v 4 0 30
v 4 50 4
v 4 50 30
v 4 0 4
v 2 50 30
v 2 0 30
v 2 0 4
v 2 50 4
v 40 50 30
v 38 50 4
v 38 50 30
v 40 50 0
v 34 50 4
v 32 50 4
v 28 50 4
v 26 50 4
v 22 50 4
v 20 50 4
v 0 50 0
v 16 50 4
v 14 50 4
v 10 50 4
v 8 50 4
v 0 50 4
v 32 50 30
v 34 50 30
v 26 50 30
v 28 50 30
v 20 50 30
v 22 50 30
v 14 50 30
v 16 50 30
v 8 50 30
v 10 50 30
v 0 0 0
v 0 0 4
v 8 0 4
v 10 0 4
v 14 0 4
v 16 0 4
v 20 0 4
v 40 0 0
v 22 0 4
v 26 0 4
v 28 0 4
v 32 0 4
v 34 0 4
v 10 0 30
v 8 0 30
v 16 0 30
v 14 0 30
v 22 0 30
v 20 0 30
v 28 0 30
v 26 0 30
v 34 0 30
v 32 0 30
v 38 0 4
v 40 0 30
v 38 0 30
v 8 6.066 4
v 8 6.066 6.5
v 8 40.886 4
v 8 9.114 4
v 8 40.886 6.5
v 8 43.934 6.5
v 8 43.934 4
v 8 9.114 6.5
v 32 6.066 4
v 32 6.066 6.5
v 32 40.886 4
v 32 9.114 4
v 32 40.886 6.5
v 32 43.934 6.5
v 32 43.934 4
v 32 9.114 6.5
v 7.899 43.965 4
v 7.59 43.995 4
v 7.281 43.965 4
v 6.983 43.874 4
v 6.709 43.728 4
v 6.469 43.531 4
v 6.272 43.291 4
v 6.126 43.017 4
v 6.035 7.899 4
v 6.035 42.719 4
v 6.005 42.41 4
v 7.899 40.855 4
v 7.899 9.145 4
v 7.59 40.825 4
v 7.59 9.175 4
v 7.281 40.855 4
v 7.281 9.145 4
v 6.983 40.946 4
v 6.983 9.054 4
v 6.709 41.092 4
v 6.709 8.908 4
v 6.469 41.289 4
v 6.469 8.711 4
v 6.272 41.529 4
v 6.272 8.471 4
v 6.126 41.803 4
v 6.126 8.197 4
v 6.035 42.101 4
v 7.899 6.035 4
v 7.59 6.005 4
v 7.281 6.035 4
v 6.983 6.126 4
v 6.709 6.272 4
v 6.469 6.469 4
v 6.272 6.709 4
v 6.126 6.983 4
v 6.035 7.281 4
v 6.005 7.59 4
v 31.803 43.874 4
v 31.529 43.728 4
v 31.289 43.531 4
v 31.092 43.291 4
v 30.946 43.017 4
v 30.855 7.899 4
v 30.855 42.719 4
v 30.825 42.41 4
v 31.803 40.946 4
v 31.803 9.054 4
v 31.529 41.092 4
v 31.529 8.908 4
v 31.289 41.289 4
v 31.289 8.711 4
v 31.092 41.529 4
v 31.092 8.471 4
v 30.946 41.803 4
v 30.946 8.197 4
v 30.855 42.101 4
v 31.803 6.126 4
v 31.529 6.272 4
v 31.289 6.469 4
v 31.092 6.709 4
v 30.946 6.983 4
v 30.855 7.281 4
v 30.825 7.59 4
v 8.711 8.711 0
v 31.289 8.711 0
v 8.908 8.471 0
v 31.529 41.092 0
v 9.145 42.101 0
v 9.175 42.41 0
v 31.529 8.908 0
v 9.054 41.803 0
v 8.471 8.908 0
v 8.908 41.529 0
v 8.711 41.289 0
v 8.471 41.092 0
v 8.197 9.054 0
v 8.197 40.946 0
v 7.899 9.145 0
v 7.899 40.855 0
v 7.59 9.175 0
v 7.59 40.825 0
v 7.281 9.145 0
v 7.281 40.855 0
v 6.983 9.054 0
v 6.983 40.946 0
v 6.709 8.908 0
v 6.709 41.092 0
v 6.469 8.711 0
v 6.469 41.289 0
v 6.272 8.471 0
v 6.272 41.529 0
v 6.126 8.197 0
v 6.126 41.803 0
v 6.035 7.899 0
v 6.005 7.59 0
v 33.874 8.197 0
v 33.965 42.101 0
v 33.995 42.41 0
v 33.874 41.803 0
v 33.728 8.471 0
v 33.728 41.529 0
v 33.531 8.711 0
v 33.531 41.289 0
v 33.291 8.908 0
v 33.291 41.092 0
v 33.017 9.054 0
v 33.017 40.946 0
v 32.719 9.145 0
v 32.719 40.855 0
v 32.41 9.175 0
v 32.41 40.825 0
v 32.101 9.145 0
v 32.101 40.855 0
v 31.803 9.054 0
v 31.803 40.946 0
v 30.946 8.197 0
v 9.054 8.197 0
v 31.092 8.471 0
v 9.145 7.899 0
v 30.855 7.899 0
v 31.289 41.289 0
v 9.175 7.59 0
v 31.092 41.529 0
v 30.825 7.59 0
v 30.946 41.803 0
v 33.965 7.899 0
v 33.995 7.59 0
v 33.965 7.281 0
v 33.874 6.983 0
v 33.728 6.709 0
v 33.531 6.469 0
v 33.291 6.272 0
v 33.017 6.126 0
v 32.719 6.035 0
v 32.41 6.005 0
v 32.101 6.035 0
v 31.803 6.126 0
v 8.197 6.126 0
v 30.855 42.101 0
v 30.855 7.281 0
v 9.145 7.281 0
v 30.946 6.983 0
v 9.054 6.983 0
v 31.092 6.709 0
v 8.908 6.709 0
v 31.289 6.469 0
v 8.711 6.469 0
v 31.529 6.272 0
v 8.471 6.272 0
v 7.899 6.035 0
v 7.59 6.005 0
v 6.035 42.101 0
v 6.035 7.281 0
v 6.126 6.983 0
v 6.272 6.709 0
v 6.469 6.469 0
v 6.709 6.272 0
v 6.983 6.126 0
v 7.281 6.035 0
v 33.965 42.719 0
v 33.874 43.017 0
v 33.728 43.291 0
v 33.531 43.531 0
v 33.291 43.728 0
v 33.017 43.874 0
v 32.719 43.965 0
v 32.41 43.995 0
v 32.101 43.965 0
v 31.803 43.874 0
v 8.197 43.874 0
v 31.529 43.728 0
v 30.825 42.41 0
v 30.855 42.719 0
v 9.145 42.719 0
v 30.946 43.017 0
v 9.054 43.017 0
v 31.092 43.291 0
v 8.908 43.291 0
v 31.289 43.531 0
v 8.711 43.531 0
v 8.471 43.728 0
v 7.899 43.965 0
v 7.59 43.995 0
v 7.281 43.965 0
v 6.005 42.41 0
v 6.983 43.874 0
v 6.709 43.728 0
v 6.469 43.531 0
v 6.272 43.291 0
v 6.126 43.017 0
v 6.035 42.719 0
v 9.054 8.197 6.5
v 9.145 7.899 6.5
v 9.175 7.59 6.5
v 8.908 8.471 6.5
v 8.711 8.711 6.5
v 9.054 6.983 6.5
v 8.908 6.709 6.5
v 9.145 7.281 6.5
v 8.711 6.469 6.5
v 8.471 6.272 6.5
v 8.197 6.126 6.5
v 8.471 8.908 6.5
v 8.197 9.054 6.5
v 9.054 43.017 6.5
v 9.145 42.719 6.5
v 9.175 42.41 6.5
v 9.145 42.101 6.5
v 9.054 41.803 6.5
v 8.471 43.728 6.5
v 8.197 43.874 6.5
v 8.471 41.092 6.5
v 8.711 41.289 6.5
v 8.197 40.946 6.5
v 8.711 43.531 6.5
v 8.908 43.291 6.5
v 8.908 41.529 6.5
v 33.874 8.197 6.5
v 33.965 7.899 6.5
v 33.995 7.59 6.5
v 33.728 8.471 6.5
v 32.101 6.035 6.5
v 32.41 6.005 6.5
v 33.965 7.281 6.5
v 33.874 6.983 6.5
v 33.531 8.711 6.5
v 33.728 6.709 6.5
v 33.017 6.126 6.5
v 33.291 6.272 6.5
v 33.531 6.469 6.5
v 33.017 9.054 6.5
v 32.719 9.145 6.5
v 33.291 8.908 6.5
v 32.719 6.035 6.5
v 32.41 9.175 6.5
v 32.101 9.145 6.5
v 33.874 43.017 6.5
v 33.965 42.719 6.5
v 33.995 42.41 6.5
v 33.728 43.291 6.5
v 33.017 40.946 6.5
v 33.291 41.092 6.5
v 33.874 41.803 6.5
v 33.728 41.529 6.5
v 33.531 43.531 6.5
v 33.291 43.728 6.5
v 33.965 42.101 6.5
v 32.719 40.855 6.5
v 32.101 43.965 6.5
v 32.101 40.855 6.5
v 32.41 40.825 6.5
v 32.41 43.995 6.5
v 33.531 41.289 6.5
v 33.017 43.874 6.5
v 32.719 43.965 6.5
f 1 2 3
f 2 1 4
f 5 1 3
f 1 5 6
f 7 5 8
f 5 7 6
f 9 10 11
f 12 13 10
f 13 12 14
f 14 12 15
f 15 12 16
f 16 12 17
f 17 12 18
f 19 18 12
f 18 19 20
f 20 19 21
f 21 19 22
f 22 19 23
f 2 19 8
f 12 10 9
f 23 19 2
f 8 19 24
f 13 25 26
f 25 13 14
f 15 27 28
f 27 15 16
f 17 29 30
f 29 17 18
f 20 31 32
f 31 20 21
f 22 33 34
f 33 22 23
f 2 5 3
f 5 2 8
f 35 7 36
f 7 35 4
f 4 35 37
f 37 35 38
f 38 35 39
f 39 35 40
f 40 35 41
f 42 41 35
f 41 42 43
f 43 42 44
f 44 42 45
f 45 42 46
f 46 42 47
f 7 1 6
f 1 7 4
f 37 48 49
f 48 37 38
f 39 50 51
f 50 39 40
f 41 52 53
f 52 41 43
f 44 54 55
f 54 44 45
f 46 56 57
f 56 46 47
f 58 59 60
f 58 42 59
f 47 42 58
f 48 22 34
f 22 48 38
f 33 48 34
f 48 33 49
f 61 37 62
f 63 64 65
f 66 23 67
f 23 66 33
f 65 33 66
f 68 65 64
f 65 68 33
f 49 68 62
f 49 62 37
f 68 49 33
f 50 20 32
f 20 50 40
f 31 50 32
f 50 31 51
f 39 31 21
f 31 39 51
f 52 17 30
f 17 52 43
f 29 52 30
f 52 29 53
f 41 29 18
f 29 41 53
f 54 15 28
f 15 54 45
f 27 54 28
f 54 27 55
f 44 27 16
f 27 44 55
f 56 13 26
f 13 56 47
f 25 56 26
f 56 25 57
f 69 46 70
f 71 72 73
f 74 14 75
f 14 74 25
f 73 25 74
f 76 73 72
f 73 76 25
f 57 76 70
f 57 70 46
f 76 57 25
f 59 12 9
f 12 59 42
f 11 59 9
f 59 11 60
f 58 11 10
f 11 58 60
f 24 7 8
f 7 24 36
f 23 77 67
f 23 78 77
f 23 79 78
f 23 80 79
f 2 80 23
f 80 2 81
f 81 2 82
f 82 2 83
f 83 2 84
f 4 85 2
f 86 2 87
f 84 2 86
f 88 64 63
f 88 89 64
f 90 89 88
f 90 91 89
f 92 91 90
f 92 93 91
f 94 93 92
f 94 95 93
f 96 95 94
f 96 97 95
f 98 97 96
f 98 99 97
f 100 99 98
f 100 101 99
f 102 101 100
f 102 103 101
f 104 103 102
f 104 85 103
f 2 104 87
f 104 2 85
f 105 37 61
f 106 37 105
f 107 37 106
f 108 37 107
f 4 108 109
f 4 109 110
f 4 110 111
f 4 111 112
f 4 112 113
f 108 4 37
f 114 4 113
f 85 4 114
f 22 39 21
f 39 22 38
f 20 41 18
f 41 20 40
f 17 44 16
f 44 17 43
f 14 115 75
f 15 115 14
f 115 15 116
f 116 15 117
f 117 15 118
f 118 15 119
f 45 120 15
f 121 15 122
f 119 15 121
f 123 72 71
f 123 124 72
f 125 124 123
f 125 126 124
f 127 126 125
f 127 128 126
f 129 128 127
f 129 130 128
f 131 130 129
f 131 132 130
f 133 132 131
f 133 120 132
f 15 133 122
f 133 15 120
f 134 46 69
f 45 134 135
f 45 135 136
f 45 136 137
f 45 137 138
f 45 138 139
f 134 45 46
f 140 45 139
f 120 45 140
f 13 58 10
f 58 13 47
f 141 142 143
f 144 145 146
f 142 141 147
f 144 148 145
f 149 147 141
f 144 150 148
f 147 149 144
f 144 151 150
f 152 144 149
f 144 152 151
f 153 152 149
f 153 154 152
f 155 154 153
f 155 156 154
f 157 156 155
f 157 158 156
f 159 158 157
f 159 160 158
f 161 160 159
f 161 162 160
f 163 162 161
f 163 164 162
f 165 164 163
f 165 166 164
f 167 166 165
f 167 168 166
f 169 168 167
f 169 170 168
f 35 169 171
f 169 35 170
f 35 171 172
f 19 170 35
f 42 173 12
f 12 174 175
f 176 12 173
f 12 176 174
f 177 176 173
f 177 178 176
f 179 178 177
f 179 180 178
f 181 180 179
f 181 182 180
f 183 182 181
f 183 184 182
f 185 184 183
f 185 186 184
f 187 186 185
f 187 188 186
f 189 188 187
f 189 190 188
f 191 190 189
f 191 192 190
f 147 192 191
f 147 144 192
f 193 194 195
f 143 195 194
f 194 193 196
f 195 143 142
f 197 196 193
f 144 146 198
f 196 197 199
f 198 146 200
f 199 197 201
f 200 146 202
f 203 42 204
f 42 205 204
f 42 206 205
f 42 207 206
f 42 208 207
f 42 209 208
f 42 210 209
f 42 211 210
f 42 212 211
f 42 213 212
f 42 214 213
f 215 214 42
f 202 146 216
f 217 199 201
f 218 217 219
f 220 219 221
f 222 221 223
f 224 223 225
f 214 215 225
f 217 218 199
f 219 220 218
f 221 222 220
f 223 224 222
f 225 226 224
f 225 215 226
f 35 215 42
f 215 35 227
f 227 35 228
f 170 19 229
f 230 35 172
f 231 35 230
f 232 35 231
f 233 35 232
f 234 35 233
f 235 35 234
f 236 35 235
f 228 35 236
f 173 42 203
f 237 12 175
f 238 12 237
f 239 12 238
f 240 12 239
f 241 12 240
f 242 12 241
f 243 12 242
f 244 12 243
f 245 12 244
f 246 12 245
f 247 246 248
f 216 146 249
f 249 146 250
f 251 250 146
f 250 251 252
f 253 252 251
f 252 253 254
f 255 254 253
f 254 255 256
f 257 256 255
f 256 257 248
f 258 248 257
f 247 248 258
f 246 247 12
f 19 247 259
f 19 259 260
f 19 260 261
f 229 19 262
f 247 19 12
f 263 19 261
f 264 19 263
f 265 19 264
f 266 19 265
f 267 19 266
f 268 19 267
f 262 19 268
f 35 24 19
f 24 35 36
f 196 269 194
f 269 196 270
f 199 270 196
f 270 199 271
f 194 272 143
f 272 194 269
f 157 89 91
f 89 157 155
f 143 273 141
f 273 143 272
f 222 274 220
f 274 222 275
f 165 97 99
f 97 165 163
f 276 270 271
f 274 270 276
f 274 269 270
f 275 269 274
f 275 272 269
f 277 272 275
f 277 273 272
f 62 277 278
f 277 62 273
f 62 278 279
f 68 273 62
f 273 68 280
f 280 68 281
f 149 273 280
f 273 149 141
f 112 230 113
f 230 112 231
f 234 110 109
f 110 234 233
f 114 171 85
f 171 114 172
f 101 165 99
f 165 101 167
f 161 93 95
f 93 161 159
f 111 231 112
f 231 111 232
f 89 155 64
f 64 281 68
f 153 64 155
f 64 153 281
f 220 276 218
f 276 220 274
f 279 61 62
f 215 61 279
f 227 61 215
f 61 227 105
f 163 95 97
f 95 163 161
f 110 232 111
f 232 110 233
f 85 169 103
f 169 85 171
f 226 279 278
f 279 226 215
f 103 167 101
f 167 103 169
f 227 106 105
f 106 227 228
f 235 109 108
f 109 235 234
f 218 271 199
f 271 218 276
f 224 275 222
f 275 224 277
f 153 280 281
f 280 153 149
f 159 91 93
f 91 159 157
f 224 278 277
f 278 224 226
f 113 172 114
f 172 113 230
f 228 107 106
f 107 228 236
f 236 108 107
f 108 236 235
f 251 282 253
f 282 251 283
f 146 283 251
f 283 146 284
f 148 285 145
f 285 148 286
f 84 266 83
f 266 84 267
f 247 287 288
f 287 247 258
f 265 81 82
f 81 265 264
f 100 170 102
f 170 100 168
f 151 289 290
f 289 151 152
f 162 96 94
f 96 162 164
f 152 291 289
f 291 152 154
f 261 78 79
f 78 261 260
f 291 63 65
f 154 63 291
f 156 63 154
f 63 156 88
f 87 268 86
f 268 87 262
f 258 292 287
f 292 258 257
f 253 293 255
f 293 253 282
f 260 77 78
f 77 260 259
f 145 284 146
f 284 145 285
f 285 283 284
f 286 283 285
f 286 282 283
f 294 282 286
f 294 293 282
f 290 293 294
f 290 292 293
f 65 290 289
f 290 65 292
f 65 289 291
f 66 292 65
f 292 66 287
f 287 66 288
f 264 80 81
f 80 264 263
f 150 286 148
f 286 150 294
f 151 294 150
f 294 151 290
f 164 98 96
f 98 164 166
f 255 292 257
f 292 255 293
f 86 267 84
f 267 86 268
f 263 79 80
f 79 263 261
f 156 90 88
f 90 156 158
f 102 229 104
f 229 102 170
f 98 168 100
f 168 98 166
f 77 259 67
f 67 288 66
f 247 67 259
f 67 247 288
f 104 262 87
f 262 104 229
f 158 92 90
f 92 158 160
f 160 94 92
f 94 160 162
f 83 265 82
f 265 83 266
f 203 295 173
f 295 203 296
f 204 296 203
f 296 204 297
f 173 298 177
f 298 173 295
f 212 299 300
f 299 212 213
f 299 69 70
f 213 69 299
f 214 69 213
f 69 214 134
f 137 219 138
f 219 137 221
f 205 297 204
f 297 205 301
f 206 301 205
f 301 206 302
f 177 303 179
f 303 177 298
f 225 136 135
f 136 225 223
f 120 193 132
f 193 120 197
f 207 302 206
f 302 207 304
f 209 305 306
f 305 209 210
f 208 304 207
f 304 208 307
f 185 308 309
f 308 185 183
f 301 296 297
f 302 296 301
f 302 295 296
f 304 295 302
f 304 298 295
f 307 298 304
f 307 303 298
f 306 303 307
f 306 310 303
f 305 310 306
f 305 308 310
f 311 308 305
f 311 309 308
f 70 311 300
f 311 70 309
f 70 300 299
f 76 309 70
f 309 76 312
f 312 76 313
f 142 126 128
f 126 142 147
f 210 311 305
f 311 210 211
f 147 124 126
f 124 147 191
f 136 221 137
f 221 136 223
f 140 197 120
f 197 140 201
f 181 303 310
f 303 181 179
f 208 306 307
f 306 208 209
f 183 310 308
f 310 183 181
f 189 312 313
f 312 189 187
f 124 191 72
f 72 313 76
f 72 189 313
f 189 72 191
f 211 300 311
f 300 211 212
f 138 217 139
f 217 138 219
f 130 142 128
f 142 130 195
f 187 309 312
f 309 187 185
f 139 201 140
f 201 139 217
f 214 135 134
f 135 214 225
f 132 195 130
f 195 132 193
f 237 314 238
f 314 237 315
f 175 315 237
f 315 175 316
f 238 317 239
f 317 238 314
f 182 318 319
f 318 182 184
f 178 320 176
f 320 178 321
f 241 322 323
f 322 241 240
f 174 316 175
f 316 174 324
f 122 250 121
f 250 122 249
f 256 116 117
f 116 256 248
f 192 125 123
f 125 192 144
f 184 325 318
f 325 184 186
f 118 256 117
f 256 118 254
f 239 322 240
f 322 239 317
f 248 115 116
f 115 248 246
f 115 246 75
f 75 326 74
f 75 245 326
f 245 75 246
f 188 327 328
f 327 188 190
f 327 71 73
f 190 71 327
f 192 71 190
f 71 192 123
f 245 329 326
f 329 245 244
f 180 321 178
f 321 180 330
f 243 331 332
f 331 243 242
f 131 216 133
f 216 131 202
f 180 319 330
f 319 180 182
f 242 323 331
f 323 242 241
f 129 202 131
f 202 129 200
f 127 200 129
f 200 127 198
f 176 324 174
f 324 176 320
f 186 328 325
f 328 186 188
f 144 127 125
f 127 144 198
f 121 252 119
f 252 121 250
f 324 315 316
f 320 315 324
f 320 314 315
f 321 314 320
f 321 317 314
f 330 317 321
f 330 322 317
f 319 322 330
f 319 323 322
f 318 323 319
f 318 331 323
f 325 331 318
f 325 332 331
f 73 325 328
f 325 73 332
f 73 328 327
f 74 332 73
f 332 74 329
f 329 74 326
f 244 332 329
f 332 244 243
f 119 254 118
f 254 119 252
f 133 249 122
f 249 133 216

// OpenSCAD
$fn = 32;

// ----------------------------------------------------------------------
// Finned heat sink: 40 x 50 mm base, 26 mm fins
// ----------------------------------------------------------------------

// --- parameters (mm) ---
base_w = 40;              // base width
base_d = 50;              // base depth
base_t = 4;               // base thickness
fin_h = 26;               // fin height above the base
holes_d = 3.17;           // fixing holes
hole_x = 12.41;           // hole offset in x
hole_y = 17.41;           // hole offset in y
fin_t = 2;                // fin thickness
fin_pitch = 6;            // fin pitch
fin_count = 7;            // number of fins
fin_x0 = 2;               // first fin offset

difference() {
  union() {
    cube([base_w, base_d, base_t]);
    for (i = [0 : fin_count - 1]) {
      translate([fin_x0 + i * fin_pitch, 0, base_t - 0.5]) cube([fin_t, base_d, fin_h + 0.5]);
    }
  }
  /* fixing holes through the base, 2.5 mm clear on both sides */
  for (hx = [-12.41, 12.41]) {
    for (hy = [-17.41, 17.41]) {
      translate([base_w / 2 + hx, base_d / 2 + hy, -2.5]) cylinder(h = base_t + 5, d = holes_d);
    }
  }
}
